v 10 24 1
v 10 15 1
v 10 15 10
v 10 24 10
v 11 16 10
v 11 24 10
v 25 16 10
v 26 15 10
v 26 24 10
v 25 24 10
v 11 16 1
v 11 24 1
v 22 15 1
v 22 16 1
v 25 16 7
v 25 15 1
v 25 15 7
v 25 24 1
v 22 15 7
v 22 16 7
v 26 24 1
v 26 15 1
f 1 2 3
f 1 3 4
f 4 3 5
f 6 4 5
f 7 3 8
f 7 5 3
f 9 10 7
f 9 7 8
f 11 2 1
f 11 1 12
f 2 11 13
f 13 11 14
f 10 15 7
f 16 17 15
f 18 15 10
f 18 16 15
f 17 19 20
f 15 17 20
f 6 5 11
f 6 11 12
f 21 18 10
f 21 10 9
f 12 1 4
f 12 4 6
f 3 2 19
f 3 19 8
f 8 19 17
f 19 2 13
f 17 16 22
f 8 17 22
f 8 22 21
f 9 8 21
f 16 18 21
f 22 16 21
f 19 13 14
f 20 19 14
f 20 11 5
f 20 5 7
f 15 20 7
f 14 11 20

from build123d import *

# Parameters (mm, degrees)
BOX002_W     = 1
BOX002_H     = 9
BOX002_DEPTH = 9
BOX003_W     = 12
BOX003_H     = 1
BOX003_DEPTH = 9
BOX004_W     = 1
BOX004_H     = 3
BOX004_DEPTH = 3
BOX099_W     = 1
BOX099_H     = 8
BOX099_DEPTH = 9


with BuildPart() as box002:
    # Box002 → Box002 (new body)
    with BuildSketch(Plane(origin=(16, 15, 1), x_dir=(1, 0, 0), z_dir=(0, 0, 1))):
        with Locations((0.5, 4.5)):
            Rectangle(BOX002_W, BOX002_H)
    extrude(amount=BOX002_DEPTH)


with BuildPart() as box003:
    # Box003 → Box003 (new body)
    with BuildSketch(Plane(origin=(1, 15, 1), x_dir=(1, 0, 0), z_dir=(0, 0, 1))):
        with Locations((6, 0.5)):
            Rectangle(BOX003_W, BOX003_H)
    extrude(amount=BOX003_DEPTH)


with BuildPart() as fusion030:
    # Box004 → Box004 (new body)
    with BuildSketch(Plane(origin=(16, 15, 7), x_dir=(0, 1, 0), z_dir=(0, 0, 1))):
        with Locations((0.5, 1.5)):
            Rectangle(BOX004_W, BOX004_H)
    extrude(amount=BOX004_DEPTH)

    # Fusion030: union Box002, Box003
    add(box002.part)
    add(box003.part)


with BuildPart() as fusion030_1:
    # Fusion030 placement: moved
    add(fusion030.part.moved(Location((9, 0, 0))))


with BuildPart() as fusion039:
    # Box099 → Box099 (new body)
    with BuildSketch(Plane(origin=(10, 16, 1), x_dir=(1, 0, 0), z_dir=(0, 0, 1))):
        with Locations((0.5, 4)):
            Rectangle(BOX099_W, BOX099_H)
    extrude(amount=BOX099_DEPTH)

    # Fusion039: union Fusion030
    add(fusion030_1.part)


solid = fusion039.part
